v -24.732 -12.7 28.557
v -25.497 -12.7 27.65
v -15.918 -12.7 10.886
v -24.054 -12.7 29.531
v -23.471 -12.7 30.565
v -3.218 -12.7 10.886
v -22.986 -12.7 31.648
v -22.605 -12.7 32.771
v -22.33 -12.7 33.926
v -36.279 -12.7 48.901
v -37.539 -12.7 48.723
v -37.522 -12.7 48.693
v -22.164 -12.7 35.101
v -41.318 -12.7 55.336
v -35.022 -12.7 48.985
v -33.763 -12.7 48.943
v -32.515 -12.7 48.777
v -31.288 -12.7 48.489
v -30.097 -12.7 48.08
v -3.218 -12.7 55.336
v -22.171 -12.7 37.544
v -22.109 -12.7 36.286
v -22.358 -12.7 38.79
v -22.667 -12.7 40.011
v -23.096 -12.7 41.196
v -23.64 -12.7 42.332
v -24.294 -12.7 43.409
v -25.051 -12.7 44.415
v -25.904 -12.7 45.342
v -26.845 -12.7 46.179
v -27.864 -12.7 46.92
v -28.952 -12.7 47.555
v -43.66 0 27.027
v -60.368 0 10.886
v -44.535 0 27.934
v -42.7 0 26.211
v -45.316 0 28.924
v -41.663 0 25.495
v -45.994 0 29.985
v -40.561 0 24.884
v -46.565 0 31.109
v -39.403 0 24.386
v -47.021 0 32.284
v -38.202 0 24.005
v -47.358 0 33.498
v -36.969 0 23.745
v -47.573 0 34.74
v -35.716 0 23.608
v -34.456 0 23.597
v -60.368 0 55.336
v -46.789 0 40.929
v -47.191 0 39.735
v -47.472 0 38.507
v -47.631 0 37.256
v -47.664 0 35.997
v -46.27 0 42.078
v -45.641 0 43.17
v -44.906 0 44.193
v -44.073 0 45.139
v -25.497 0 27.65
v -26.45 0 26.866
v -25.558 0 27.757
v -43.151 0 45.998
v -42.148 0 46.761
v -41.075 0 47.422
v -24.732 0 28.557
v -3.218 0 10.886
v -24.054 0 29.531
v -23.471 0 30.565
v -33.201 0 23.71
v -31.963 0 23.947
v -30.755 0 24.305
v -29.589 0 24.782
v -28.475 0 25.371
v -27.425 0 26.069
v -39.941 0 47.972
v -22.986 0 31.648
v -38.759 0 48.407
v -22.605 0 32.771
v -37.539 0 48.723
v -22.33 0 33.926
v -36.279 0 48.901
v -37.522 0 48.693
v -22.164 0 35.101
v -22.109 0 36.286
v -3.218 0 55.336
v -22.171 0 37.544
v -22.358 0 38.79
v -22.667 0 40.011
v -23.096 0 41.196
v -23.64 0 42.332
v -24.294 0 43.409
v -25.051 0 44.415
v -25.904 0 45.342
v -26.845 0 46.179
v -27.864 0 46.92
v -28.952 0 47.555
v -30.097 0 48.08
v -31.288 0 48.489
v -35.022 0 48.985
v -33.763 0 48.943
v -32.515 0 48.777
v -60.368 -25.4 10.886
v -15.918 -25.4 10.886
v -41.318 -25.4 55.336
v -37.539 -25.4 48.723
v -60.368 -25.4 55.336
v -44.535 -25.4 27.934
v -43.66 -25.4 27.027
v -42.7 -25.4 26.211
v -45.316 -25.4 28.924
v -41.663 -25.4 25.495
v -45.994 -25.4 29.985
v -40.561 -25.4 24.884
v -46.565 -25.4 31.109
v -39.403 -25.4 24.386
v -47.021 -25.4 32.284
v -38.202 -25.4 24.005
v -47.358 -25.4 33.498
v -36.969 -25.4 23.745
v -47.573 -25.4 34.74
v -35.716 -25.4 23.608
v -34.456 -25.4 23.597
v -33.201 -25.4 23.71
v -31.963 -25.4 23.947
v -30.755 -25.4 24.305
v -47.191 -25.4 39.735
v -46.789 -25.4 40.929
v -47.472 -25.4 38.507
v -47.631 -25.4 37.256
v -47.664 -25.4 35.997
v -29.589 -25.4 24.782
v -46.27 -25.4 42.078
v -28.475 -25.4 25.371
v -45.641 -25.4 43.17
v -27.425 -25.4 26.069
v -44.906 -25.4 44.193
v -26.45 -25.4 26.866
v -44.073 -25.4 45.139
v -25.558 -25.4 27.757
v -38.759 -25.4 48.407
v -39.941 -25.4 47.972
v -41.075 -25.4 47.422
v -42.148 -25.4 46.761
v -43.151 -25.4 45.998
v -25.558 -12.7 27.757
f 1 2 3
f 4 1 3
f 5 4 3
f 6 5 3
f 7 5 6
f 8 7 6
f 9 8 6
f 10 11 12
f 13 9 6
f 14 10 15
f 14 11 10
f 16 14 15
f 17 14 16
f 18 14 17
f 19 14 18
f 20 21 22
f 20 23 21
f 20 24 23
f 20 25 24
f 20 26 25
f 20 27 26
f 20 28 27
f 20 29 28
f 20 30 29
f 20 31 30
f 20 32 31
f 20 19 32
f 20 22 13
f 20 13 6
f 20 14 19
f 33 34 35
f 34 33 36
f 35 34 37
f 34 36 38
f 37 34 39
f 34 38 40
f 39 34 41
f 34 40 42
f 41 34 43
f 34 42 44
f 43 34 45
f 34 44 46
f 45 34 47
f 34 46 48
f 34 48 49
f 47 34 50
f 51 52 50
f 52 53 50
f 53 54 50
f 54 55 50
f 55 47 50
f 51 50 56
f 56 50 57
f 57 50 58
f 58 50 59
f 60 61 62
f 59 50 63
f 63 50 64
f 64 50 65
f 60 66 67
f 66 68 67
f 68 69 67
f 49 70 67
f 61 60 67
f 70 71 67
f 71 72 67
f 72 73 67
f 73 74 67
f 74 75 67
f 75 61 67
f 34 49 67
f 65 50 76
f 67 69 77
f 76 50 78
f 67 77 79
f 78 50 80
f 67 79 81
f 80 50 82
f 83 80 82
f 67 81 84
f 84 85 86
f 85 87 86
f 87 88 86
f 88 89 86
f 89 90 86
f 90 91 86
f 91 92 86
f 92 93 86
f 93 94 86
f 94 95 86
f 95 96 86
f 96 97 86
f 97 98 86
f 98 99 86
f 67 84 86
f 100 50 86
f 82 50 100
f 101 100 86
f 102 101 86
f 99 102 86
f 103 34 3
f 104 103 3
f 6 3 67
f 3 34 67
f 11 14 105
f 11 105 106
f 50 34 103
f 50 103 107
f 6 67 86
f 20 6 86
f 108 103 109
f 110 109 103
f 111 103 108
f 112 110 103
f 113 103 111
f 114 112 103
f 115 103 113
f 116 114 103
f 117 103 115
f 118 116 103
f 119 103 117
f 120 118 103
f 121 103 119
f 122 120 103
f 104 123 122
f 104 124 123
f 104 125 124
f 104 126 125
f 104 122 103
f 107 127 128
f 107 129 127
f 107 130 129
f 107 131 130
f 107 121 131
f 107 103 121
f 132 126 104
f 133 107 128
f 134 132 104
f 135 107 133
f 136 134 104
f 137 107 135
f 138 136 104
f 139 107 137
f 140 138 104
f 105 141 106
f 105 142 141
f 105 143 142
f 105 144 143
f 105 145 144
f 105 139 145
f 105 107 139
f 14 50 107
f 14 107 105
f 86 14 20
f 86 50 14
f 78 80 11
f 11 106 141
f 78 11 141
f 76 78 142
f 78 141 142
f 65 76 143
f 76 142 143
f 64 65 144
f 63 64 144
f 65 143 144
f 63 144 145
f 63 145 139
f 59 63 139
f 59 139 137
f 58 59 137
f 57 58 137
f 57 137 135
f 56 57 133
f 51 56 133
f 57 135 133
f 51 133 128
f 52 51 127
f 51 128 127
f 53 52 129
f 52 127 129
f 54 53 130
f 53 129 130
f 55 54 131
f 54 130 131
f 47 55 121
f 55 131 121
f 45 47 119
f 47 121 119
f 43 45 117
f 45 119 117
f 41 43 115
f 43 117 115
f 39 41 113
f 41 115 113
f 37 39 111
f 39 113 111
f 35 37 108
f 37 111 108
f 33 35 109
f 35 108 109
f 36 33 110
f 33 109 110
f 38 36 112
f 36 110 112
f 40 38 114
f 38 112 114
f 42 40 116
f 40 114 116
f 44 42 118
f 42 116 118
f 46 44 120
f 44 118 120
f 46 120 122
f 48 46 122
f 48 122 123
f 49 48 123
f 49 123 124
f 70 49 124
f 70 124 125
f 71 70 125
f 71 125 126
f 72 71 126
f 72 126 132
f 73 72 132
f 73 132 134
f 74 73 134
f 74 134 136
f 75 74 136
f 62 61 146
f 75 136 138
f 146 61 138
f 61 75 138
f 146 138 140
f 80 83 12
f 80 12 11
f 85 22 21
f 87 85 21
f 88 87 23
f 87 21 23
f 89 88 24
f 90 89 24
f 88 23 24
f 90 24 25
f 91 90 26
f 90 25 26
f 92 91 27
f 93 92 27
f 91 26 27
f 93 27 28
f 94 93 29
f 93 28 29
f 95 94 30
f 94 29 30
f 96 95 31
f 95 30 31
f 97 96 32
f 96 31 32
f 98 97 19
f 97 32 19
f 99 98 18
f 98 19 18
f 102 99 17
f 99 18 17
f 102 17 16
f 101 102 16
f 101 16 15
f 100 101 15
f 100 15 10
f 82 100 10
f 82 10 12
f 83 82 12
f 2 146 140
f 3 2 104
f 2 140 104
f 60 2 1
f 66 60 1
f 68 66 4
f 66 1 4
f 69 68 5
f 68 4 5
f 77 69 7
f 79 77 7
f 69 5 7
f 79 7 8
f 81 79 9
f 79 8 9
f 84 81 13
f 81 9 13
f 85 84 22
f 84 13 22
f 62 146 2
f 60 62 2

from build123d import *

# Parameters (mm, degrees)
F0_W     = 57.15
F0_H     = 44.45
F1_DEPTH = 25.4
F3_DEPTH = 12.7
F5_DEPTH = 25.4
F7_DEPTH = 25.4


with BuildPart() as f1:
    # F0 (on Front) → F1 (new body)
    with BuildSketch(Plane.XZ):
        with Locations((-31.7926909775, 33.1113487823)):
            Rectangle(F0_W, F0_H)
    extrude(amount=F1_DEPTH)

    # F2 (on face) → F3 (cut)
    with BuildSketch(Plane.XZ.offset(25.4)):
        Polygon((-3.2176909775, 55.3363487823), (-41.3176909775, 55.3363487823), (-15.9176909775, 10.8863487823), (-3.2176909775, 10.8863487823), align=None)
    extrude(amount=-F3_DEPTH, mode=Mode.SUBTRACT)

    # F4 (on face) → F5 (cut)
    with BuildSketch(Plane.XZ.offset(12.7)):
        with BuildLine():
            ThreePointArc((-25.4969780125, 27.6501010936), (-22.985960662, 31.6477533043), (-22.1085421056, 36.2863487823))
            ThreePointArc((-22.1085421056, 36.2863487823), (-26.8450546809, 46.1794205013), (-37.5215921901, 48.6931759045))
            Line((-37.5215921901, 48.6931759045), (-25.4969780125, 27.6501010936))
        make_face()
    extrude(amount=-F5_DEPTH, mode=Mode.SUBTRACT)

    # F6 (on face) → F7 (cut)
    with BuildSketch(Plane.XZ.offset(25.4)):
        with BuildLine():
            Line((-25.5580813343, 27.7570319068), (-37.5388390822, 48.7233579656))
            ThreePointArc((-37.5388390822, 48.7233579656), (-45.9943788824, 29.9853842652), (-25.5580813343, 27.7570319068))
        make_face()
    extrude(amount=-F7_DEPTH, mode=Mode.SUBTRACT)


solid = f1.part
